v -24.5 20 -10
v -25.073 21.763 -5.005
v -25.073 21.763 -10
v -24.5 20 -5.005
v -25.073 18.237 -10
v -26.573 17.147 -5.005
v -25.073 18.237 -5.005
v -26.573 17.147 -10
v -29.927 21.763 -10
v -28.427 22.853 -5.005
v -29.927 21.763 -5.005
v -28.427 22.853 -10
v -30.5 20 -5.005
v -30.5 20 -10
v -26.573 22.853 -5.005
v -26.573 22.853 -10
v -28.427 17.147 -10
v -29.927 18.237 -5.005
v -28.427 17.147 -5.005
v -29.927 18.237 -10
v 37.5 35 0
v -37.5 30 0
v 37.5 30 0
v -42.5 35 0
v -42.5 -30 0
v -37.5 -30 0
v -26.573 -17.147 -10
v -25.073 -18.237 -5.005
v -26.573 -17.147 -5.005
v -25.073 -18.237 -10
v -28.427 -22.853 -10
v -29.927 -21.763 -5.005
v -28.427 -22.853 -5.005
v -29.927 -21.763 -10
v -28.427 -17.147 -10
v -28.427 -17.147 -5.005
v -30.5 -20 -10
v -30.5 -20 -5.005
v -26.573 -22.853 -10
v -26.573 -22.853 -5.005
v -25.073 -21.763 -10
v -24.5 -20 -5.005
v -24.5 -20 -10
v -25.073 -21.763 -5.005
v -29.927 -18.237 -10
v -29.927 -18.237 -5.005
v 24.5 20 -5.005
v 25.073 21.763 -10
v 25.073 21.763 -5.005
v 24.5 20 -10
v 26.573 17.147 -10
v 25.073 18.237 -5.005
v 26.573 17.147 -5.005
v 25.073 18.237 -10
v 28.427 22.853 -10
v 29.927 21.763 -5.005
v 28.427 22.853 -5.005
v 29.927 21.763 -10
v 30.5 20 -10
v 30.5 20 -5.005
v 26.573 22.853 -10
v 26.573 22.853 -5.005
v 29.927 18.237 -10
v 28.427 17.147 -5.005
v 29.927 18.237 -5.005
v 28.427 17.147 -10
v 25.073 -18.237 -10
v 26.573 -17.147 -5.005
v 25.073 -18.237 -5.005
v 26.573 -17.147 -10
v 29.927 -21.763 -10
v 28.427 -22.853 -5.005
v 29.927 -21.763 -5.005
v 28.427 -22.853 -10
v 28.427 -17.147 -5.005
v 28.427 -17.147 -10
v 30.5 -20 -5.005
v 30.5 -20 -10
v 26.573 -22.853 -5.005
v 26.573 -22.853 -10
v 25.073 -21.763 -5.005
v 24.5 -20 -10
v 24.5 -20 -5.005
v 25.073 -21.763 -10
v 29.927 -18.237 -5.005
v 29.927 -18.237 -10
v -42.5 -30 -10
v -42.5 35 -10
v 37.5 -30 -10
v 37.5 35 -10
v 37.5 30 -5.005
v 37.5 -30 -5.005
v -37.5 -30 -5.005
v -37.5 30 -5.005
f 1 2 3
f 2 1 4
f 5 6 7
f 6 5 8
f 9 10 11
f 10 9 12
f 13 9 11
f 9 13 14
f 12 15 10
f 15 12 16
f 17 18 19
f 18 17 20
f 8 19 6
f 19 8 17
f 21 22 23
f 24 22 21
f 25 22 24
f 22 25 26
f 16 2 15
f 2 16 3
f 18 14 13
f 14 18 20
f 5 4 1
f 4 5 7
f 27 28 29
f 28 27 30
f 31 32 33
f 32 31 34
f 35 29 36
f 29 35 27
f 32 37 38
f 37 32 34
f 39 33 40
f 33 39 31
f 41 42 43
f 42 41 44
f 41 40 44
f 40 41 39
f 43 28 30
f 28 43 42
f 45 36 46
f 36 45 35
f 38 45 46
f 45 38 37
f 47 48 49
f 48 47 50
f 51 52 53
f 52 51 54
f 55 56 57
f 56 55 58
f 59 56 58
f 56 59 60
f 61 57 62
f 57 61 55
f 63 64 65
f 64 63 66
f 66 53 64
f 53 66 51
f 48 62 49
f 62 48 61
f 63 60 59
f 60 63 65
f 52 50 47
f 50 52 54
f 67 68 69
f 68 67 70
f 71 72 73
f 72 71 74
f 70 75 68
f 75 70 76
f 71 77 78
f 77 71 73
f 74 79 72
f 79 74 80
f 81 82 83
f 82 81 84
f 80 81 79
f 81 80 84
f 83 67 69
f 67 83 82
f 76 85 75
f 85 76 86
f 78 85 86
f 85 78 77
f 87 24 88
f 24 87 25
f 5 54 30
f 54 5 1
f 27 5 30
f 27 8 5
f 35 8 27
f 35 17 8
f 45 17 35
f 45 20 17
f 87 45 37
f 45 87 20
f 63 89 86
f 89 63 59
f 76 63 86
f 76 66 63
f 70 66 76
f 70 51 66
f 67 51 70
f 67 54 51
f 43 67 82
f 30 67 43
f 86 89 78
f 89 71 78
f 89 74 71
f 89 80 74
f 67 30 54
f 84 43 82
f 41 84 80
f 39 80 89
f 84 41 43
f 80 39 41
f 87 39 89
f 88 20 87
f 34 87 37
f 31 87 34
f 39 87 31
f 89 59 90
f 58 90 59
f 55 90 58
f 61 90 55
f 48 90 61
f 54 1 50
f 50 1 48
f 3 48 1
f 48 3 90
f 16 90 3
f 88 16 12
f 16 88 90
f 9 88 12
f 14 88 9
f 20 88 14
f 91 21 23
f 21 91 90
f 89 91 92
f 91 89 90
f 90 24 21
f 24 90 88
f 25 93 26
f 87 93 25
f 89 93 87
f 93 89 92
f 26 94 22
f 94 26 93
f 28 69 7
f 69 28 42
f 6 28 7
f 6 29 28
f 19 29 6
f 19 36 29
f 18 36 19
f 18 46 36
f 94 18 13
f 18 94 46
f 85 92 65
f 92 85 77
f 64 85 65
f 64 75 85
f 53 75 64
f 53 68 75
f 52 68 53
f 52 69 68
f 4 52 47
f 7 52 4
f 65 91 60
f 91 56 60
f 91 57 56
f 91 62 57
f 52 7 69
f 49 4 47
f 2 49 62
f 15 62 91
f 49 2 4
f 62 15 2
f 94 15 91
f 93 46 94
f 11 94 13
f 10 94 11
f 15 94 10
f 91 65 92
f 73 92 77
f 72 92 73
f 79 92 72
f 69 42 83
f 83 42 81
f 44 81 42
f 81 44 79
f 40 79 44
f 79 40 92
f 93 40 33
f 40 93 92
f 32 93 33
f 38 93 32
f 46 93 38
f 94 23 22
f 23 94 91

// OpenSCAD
// file: Lib/o-ring.scad
module o_ring(id=20,girth=2.5,$fn=180){
    rotate_extrude(angle=360,$fn=$fn)translate([(id+girth)/2,0])circle(d=girth);
    //cylinder(d=id,h=0.1, center=true);    
}

//o_ring(id=40, girth=5);


module o_ring_groove(girth=3,length = 50, height = 100, radius = 15){
    translate([radius+(girth/2),radius+(girth/2),0]){
        difference(){
            o_ring(id=radius*2,girth=girth, $fn=$fn);
            translate([15,0,0])cube([30,40,6], center=true);
            translate([0,15,0])cube([40,30,6], center=true);
        }

        translate([-radius-(girth/2),length/2,0])
            rotate([90,0,0])
                cylinder(h=length+0.01,d=girth, center=true);

        translate([height/2,-radius-(girth/2),0])
            rotate([0,90,0])
                cylinder(h=height+0.01,d=girth, center=true);
    }
}

o_ring_groove();
// file: Lib/fillet_cylinder.scad
module filleted_cylinder(
    cylinder_height=2,
    cylinder_radius=1,
    fillet_radius_bottom=1,
    fillet_radius_top=0,
    nfaces=50
) {
    /* created by Kevin Lam on Dec 3, 2016 */
    union() {      
        cylinder(cylinder_height, r=cylinder_radius, $fn=nfaces, false);
        
        if (fillet_radius_bottom > 0) {
            difference() {
                cylinder(fillet_radius_bottom, r=cylinder_radius+fillet_radius_bottom, $fn=nfaces, false);
                translate([0, 0, fillet_radius_bottom])
                rotate_extrude($fn=nfaces)
                translate([cylinder_radius+fillet_radius_bottom, 0, 0])
                circle(fillet_radius_bottom, $fn=nfaces);
            }
        }
        
        if (fillet_radius_top>0) {
            difference() {
                translate([0,0,cylinder_height-fillet_radius_top])
                cylinder(fillet_radius_top, r=cylinder_radius+fillet_radius_top, $fn=nfaces, false);
                
                translate([0, 0, cylinder_height-fillet_radius_top])
                rotate_extrude($fn=nfaces)
                translate([cylinder_radius+fillet_radius_top, 0, 0])
                circle(fillet_radius_top, $fn=nfaces);
            }
        }
    }
}
// file: Lib/prism.scad
   module prism(l, w, h){
   polyhedron(
           points=[[0,0,0], [l,0,0], [l,w,0], [0,w,0], [0,w,h], [l,w,h]],
           faces=[[0,1,2,3],[5,4,3,2],[0,4,5,1],[0,3,4],[5,2,1]]
           );

   }
   
// file: Lib/corner_radiuser.scad
module cornerRadiuser(radius=6){
    difference(){
        translate([radius/2,radius/2,0])
        cube([radius,radius,radius*2], center=true);
        cylinder(h=(radius*2)+2,r=radius, center=true);
    }
}
// file: Lib/steppers.scad
/**
 * Implementation of a model of a 28BYJ-48 type cheapo stepper motor
 */
use <mirrorcopy.scad>;
module stepper28BYJ48(){
    color("light grey"){
        translate([0,-8,0]){
            // Motor body
            translate([0,0,(19/2)*-1]){
                cylinder(d=28,h=19, center=true);
            }

            // Motor snooter
            translate([0,8,0]){
                translate([0,0,(1.5/2)])cylinder(d=9,h=1.5, center=true);
                difference(){
                    translate([0,0,(5/2)+2])cylinder(d=5,h=6, center=true);
                    mirrorCopy([0,1,0]){
                        translate([0,4,(5/2)+2.1])cube([5,5,6.2], center=true);
                    }
                }
            }
            
            // cable gland
            translate([0,(17/2)*-1,(19/2)*-1]){
                cube([14.8,17,19], center=true);
            }
            
            // Attachment crossbar
            difference(){
                hull(){
                    mirrorCopy([1,-0,0]){
                        translate([(35/2),0,(1/2)*-1]){
                            cylinder(h=1,d=7, center=true);
                        }
                    }
                }
                mirrorCopy([1,-0,0]){
                    translate([(35/2),0,(1/2)*-1]){
                        cylinder(h=1+0.01,d=4.2, center=true);
                    }
                }
            }
        }
    }
}


module stepper28BYJ48_cutouts(){
    color("orange"){
        translate([0,-8,0]){
            mirrorCopy([1,-0,0]){
                translate([(35/2),0,(1/2)*-1]){
                    cylinder(h=1+0.01,d=4.2, center=true);
                }
            }
        }
    }
}

module nemaCutout(shaftClearance, shaftGirth, shaftLength, frameSize, holeSpacing,holeDiameter=3,       nemaSlotSlackMM=0, shaft=false){
    translate([0,0,frameSize/-2]){
        hull(){
            mirrorCopy([0,1,0]){
                translate([0,nemaSlotSlackMM/2]){
                    cube([frameSize*1.01,frameSize*1.01,frameSize], center=true);
                }
            }
        }
    }
    if(!shaft){
        translate([0,0,10/2]){
            mirrorCopy([1,0,0]){
                mirrorCopy([0,1,0]){
                    translate([holeSpacing/2,holeSpacing/2,0]){
                        hull(){
                            mirrorCopy([0,1,0]){
                                translate([0,nemaSlotSlackMM/2,0]){
                                    cylinder(d=holeDiameter*1.1,h=30,center=true);
                                }
                            }
                        }
                    }
                }
            }
        }
    }
    
    if(!shaft){
        translate([0,0,-0.5]){
            cylinder(d=shaftClearance*1.03,h=shaftLength+1);
        }
    }else{
        difference(){
            cylinder(d=shaftGirth*1.03,h=shaftLength*2, $fn=360);
            translate([frameSize/-2,(shaftGirth/2)-(shaftGirth)*0.15,shaftLength*0.3+0.01]){
                cube([frameSize,frameSize/2,shaftLength*0.70]);
                translate([0,0,shaftLength*0.70-1])cube([frameSize,frameSize/2,shaftLength+1]);
            }
        }
    }
}

module nema14_cutout(){
    nemaCutout(22,5,24,35,26,3,2, shaft);
}

module nema17_cutout(shaft=false){
    
    nemaCutout(22,5,24,42.3,31,3,2, shaft);
}

nema17_cutout(true);
// file: Lib/metric_bolts.scad
capSizeMSizeMultiplier = 1.66*1.01;
printingKerfMM = 0.6;
circleFacets = 60;
boltColour = "LightSkyBlue";
boltClearanceColour = "LightSteelBlue";
boltClearanceTransparency = 0.3;

module metricBoltHex(mSize, structural=false, recessNut=0, recessNutIsCircleMM=false, chamfer=false){
    // Hex diameter = mSize * 1.8, (or 2.0 if structural
    // We add 1% to make the hex slip in better
    hexDiameter = (mSize * (structural?2.0:1.8) * 1.01) + printingKerfMM;

    color(boltColour)
    translate([0,0,(mSize*0.7)/2])
    cylinder(d=hexDiameter,h=mSize * 0.7, $fn=6, center=true);
    
    if(recessNut > 0){
        if(recessNutIsCircleMM==false){
            color(boltClearanceColour, boltClearanceTransparency)
                translate([0,0,(recessNut/2)*-1+0.1])
                    cylinder(d=hexDiameter,h=recessNut+0.1, $fn=6, center=true);
        }else{
            color(boltClearanceColour, boltClearanceTransparency)
                translate([0,0,(recessNut/2)*-1+0.1])
                    cylinder(d=recessNutIsCircleMM>hexDiameter?recessNutIsCircleMM:hexDiameter,h=recessNut+0.1, $fn=circleFacets, center=true);
        }
    }
    if(chamfer){
        chamferHeight = mSize*1.5*0.595;
        color(boltClearanceColour, boltClearanceTransparency)
            translate([0,0,(mSize * 0.7)+(chamferHeight/2)])
                cylinder(d1=hexDiameter,d2=0,h=chamferHeight, center=true, $fn=6);
    }
}

module metricSocketCap(mSize, length, structural=false,recessCap=0, chamfer=false, overrideCapSize=0){
    //cap size = M number * 1.5.
    // We add 1% to make the cap head spin nicely in the hole.
    capSize = overrideCapSize > 0 ? overrideCapSize : (mSize * capSizeMSizeMultiplier) + printingKerfMM;
    
    color(boltColour)
        translate([0,0,(length + ((mSize*1.25)/2))])
            cylinder(d=capSize,h=mSize*1.25, center=true, $fn=circleFacets);
    //echo (str("cap size is ", capSize));
    if(recessCap > 0){
        color(boltClearanceColour, boltClearanceTransparency)
        translate([0,0,(length + ((recessCap/2)+(mSize*1.25)))])
        cylinder(d=capSize,h=recessCap+0.01, center=true, $fn=circleFacets);
    }
    if(chamfer){
        color(boltClearanceColour, boltClearanceTransparency)
        translate([0,0,(length-((mSize*1.5*0.595)/2))])
        cylinder(d2=capSize,d1=0,h=mSize*1.5*0.595, center=true, $fn=circleFacets);
    }
}

module metricShaft(mSize, length, structural=false){
    color(boltColour)
        translate([0,0,(length/2)])
            cylinder(d=mSize+printingKerfMM, h=length+0.01, center=true, $fn=circleFacets);
}

module metricSocketScrew(mSize, length, structural=false, recessCap=0, chamfer=false, overrideCapSize=0){
    metricSocketCap(mSize, length, structural=structural, recessCap=recessCap, chamfer=chamfer, overrideCapSize=overrideCapSize);
    metricShaft(mSize, length, structural=structural);
}

module metricCapheadAndBolt(mSize, length=40, structural=false, recessCap=0, recessNut=0, recessNutIsCircleMM=false, chamfer=false, overrideCapSize=0){
    capSize = overrideCapSize > 0 ? overrideCapSize : (mSize * capSizeMSizeMultiplier) + printingKerfMM;

    /*echo (str("Creating a M",mSize, " size, ", length, "mm long bolt with a ", capSize, "mm wide caphead and bolt ", chamfer?"with":"without", " chamfering."));
    if(recessCap){
        echo (str("It has a ", recessCap, "mm recessed cap"));
    }
    if(recessNut){
        echo (str("It has a ", recessCap, "mm recessed nut"));
    }/**/
    translate([0,0,((length/2)+((mSize*1.25)/2))*-1])
    union(){
        translate([0, 0, 0])
        metricSocketScrew(mSize, length, structural=structural, recessCap=recessCap, chamfer=chamfer, overrideCapSize=overrideCapSize);
        metricBoltHex(mSize,structural, recessNut=recessNut, recessNutIsCircleMM=recessNutIsCircleMM, chamfer=chamfer);
    }
}

/**/
translate([0,10,0])
metricCapheadAndBolt(6, 40);

translate([0,10,0])
metricCapheadAndBolt(6, 40, recessNut=20, recessNutIsCircleMM=20);

translate([20,10,0])
metricCapheadAndBolt(6, 40, recessNut=1, recessCap=1, chamfer=true);
/**/
/*
translate([0,10,0])
metricCapheadAndBolt(6, 20, recessNut=10, recessCap=10);
/*
translate([0,20,0])
metricCapheadAndBolt(6, 20, chamfer=true);

translate([20,0,0])
metricCapheadAndBolt(10, 40);

translate([20,20,0])
metricCapheadAndBolt(10, 40, recessNut=10, recessCap=10);

translate([20,40,0])
metricCapheadAndBolt(10, 40, chamfer=true);
*/
// file: Lib/pcd.scad
module pcd(degrees, totalDegrees=360){
    count=totalDegrees/degrees;
    for(i=[1 : count]){
        rotate(degrees*i)
        children();
    }
}

module pcdAtFixedDegrees(degrees){
    for(degree=degrees){
        rotate(degree)
        children();
    }
}

pcd(30)
    translate([30,0,0])
        cylinder(h=10,d=5, center=true, $fn=30);
// file: Lib/extrusion.scad
use <mirrorcopy.scad>
module doubleExtrusion(width,length, center=false){
    extraWallWidth = width*0.09;
    mirrorCopy([0,1,0]){
        color("orange")
        translate([0,(width - extraWallWidth)/2,length/2])
        cube([center?0:width/2,extraWallWidth,length], center=true);
    }
    
    translate([(width/2),0,0])
    children();
    translate([(width/2)*-1,0,0])
    children();
    color("grey",0.1)hull(){
        translate([(width/2),0,0])
        children();
        translate([(width/2)*-1,0,0])
        children();
    }
}

module extrusion_sub(length=10, outer=40, tSlot=8, gusset=4.5, bore=7, center=false){
    translate([0,0,center?0:length/2]){
        difference(){
            color("orange")
            union(){
                // Corners
                mirrorCopy([1,0,0]){
                    mirrorCopy([0,1,0]){
                        difference(){
                            union(){
                                translate([((outer-(outer-tSlot)/2)/2),(outer-(gusset))/2,0])
                                cube([(outer-tSlot)/2, (gusset),length], center=true);
                                mirror([-1,1,0])
                                translate([((outer-(outer-tSlot)/2)/2),(outer-(gusset))/2,0])
                                cube([(outer-tSlot)/2, (gusset),length], center=true);
                            }
                            difference(){
                                translate([((outer-(gusset))/2)+1,((outer-(gusset))/2)+1,0])
                                    cube([gusset*2,gusset*2,length+2], center=true);
                                translate([(outer-(gusset*2))/2,(outer-(gusset*2))/2,0])
                                    cylinder(d=gusset*2,h=length+4, center=true);
                            }
                        }
                    }
                }
                
                // Crossbar
                mirrorCopy(){
                    rotate(45)
                    cube([outer*1.3, gusset, length], center=true);
                }
                
                // Core
                cube([bore*2,bore*2,length], center=true);
            };
            
            union(){
                // Tappable Bore
                cylinder(d=bore, h=length+2, center=true);
            }
        }
    }
}
module extrusion(length=10, outer=40, tSlot=8, gusset=4.5, bore=7, center=false){
    color("grey",0.1)hull()extrusion_sub(length=length, outer=outer, tSlot=tSlot, gusset=gusset, bore=bore, center=center);
    extrusion_sub(length=length, outer=outer, tSlot=tSlot, gusset=gusset, bore=bore, center=center);
    echo(str("BOM: Extrusion(",outer,"mm) length=",length,"mm"));
}

module extrusion80x40(length, center=false){
    doubleExtrusion(40,length, center=center)
    extrusion40x40(length, center=center);
}
module extrusion60x30(length, center=false){
    doubleExtrusion(30,length, center=center)
    extrusion30x30(length, center=center);
}
module extrusion40x20(length, center=false){
    doubleExtrusion(20,length, center=center)
    extrusion20x20(length, center=center);
}

module extrusion20x20(length, center=false)
{
    extrusion(length=length, outer=20,tSlot=5, gusset=1.8, bore=4, center=center);
}

module extrusion30x30(length, center=false)
{
    extrusion(length=length, outer=30,tSlot=8, gusset=2.5, bore=7, center=center);
}

module extrusion40x40(length, center=false)
{
    extrusion(length=length, outer=40,tSlot=8, gusset=4.5, bore=7, center=center);
}
/**/
translate([-40,0,0])extrusion20x20(10, center=true);
translate([-60,30,0])extrusion30x30(10, center=true);
translate([-80,30+40,0])extrusion40x40(10, center=true);

translate([0,0,0])extrusion20x20(10);
translate([0,30,0])extrusion30x30(10);
translate([0,30+40,0])extrusion40x40(10);

translate([40,0,0])extrusion40x20(10);
translate([60,30,0])extrusion60x30(10);
translate([80,30+40,0])extrusion80x40(10);
/**/
// file: Lib/part_splitter.scad
module partSplitter(height=0,maxSize=200, spread=10, top=true, bottom=true){
    if($preview){
        children();
        translate([0,0,height])
            #cube([maxSize,maxSize,0.01], center=true);
    }else{
        if(top){
            color("red")
                translate([0,0,(spread/2)])
                    difference(){
                        children();
                        translate([0,0,((maxSize/2)*-1)+height])
                            cube([maxSize,maxSize,maxSize], center=true);
                    }
        }
        if(bottom){
            color("green")
                translate([0,0,(spread/2)*-1])
                    difference(){
                        children();
                        translate([0,0,(maxSize/2)+height])
                            cube([maxSize,maxSize,maxSize], center=true);
                    }
        }
    }
} 
// file: Lib/mirrorcopy.scad
module mirrorCopy(vec=[1,0,0], vec2=[0,0,0], vec3=[0,0,0]){
    
    //echo(str("Vec1=",vec," Vec2=", vec2, " Vec3=", vec3));
    children();
    mirror(vec) children();

    if(vec2){    
        mirror(vec2){
            children();
            mirror(vec) children();
        }
    }

    if(vec3){
        mirror(vec3){
            children();
            mirror(vec) children();
            mirror(vec2){
                children();
                mirror(vec) children();
            }
        }
    }
    
} 

mirrorCopy([1,0,0])color("green")translate([5,10,0])cylinder(h=1,d=5,center=true);
mirrorCopy([1,0,0],[0,1,0])color("blue")translate([10,5,0])cylinder(h=1,d=5,center=true);
mirrorCopy([1,0,0],[0,1,0],[0,0,1])color("red")translate([15,10,5])cylinder(h=1,d=5,center=true);
// file: Lib/bearings.scad
$useMcMaster = true;
module bearing(id, od, wd, mcmaster, series, labels=false){
    //echo(str("Creating a ", series, " bearing with id=", id, "mm od=", od, "mm width=", wd, "mm ..."));
    difference(){
        color("grey")cylinder(d=od,h=wd, center=true);
        color("white")cylinder(d=id,h=wd+1, center=true);  
        if($preview && labels){
            bearing_lettering(id, od, wd, mcmaster, series);    
        }
    }
}

module bearing_lettering(id, od, wd, mcmaster, series)
{
    degreesSeries = 25*len(series);
    degreesMcMaster = 25*len(mcmaster);
    color("black")
    rotate(180+45){
        rotate(degreesSeries)
        bearing_text(id,od, wd, series,degreesSeries);
        if($useMcMaster){
            rotate(degreesMcMaster+degreesSeries+10)
            bearing_text(id,od, wd, mcmaster, degreesMcMaster);   
        }
    }
}

module bearing_text(id, od, wd, st, radiusConsumed=180){
    bearingGirth = (od-id)/2;
    letterHeight = bearingGirth * 0.6;
    letterOffsetFromCenter = (od/2) - (bearingGirth*0.9);
    
    width=bearingGirth ;
    thickness=wd/20 ;
    chars=len(st)+1 ;
    //echo(str("Writing ", st, " at " , letterOffsetFromCenter, "mm from center"));
    for (i = [1:chars]) {
            rotate([0,0,90-(i*(radiusConsumed/chars))])
            translate([0,letterOffsetFromCenter,(bearingGirth/2)-((thickness+1)/2)])
            linear_extrude(thickness+1)
            text(st[i-1],size=letterHeight, halign="center");
    }
}


module bearing_608(labels=true){ bearing(8,22,7,"5972K91","608", labels=labels); }
module bearing_626(labels=true){ bearing(6,19,6,"6661K11","626", labels=labels); }
module bearing_629(labels=true){ bearing(9,26,8,"5972K93","629", labels=labels); }
module bearing_635(labels=true){ bearing(5,19,6,"5972K197","635", labels=labels); }
module bearing_6000(labels=true){ bearing(10,26,8,"5972K94","6000", labels=labels); }
module bearing_6001(labels=true){ bearing(12,28,8,"5972K95","6001", labels=labels); }
module bearing_6002(labels=true){ bearing(15,32,9,"5972K358","6002", labels=labels); }
module bearing_6003(labels=true){ bearing(17,35,10,"5972K311","6003", labels=labels); }
module bearing_6007(labels=true){ bearing(35,62,14,"5972K312","6007", labels=labels); }
module bearing_6200(labels=true){ bearing(10,30,9,"5972K101","6200", labels=labels); }
module bearing_6201(labels=true){ bearing(12,32,10,"5972K313","6201", labels=labels); }
module bearing_6202(labels=true){ bearing(15,35,11,"5972K314","6202", labels=labels); }
module bearing_6203(labels=true){ bearing(17,40,12,"5972K104","6203", labels=labels); }
module bearing_6204(labels=true){ bearing(20,47,14,"5972K105","6204", labels=labels); }
module bearing_6205(labels=true){ bearing(25,52,15,"5972K315","6205", labels=labels); }
module bearing_6206(labels=true){ bearing(30,62,16,"5972K316","6206", labels=labels); }
module bearing_6207(labels=true){ bearing(35,72,17,"5972K317","6207", labels=labels); }
module bearing_6208(labels=true){ bearing(40,80,18,"5972K114","6208", labels=labels); }
module bearing_6209(labels=true){ bearing(45,85,19,"5972K115","6209", labels=labels); }
module bearing_6210(labels=true){ bearing(50,90,20,"5972K129","6210", labels=labels); }
module bearing_6211(labels=true){ bearing(55,100,21,"5972K113","6211", labels=labels); }
module bearing_6212(labels=true){ bearing(60,110,22,"5972K3","6212", labels=labels); }
module bearing_6301(labels=true){ bearing(12,37,12,"5972K318","6301", labels=labels); }
module bearing_6302(labels=true){ bearing(15,42,13,"5972K117","6302", labels=labels); }
module bearing_6303(labels=true){ bearing(17,47,14,"5972K118","6303", labels=labels); }
module bearing_6304(labels=true){ bearing(20,52,15,"5972K119","6304", labels=labels); }
module bearing_6305(labels=true){ bearing(25,62,17,"5972K121","6305", labels=labels); }
module bearing_6306(labels=true){ bearing(30,72,19,"5972K319","6306", labels=labels); }
module bearing_6307(labels=true){ bearing(35,80,21,"5972K503","6307", labels=labels); }
module bearing_6308(labels=true){ bearing(40,90,23,"5972K124","6308", labels=labels); }
module bearing_6309(labels=true){ bearing(45,100,25,"5972K125","6309", labels=labels); }
module bearing_6310(labels=true){ bearing(50,110,27,"5972K126","6310", labels=labels); }
module bearing_6311(labels=true){ bearing(55,120,29,"5972K127","6311", labels=labels); }
module bearing_6312(labels=true){ bearing(60,130,31,"5972K128","6312", labels=labels); }
module bearing_6403(labels=true){ bearing(17,62,17,"5972K198","6403", labels=labels); }
module bearing_6800(labels=true){ bearing(10,19,5,"5972K211","6800", labels=labels); }
module bearing_6801(labels=true){ bearing(12,21,5,"5972K212","6801", labels=labels); }
module bearing_6802(labels=true){ bearing(15,24,5,"5972K213","6802", labels=labels); }
module bearing_6803(labels=true){ bearing(17,26,5,"5972K214","6803", labels=labels); }
module bearing_6804(labels=true){ bearing(20,32,7,"5972K215","6804", labels=labels); }
module bearing_6805(labels=true){ bearing(25,37,7,"5972K216","6805", labels=labels); }
module bearing_6806(labels=true){ bearing(30,42,7,"5972K217","6806", labels=labels); }
module bearing_6900(labels=true){ bearing(10,22,6,"5972K241","6900", labels=labels); }
module bearing_6901(labels=true){ bearing(12,24,6,"5972K242","6901", labels=labels); }
module bearing_6902(labels=true){ bearing(15,28,7,"5972K243","6902", labels=labels); }
module bearing_6903(labels=true){ bearing(17,30,7,"5972K244","6903", labels=labels); }
module bearing_6904(labels=true){ bearing(20,37,9,"5972K245","6904", labels=labels); }
module bearing_6905(labels=true){ bearing(25,42,9,"5972K246","6905", labels=labels); }
module bearing_6906(labels=true){ bearing(30,47,9,"5972K247","6906", labels=labels); }
module bearing_6907(labels=true){ bearing(35,55,10,"5972K248","6907", labels=labels); }
module bearing_6908(labels=true){ bearing(40,62,12,"5972K249","6908", labels=labels); }
module bearing_16002(labels=true){ bearing(15,32,8,"5972K199","16002", labels=labels); }
module bearing_16004(labels=true){ bearing(20,42,8,"5972K218","16004", labels=labels); }
module bearing_16005(labels=true){ bearing(25,47,8,"5972K219","16005", labels=labels); }
module bearing_16100(labels=true){ bearing(10,28,8,"5972K223","16100", labels=labels); }
module bearing_16101(labels=true){ bearing(12,30,8,"5972K224","16101", labels=labels); }

translate([0,0,0])
{   
    bearing_6800();
    bearing_6804();
    bearing_6907();
    translate([50,0,0])
    bearing_16101();
}


translate([0,60,0])
{   
    bearing_6800(labels=false);
    bearing_6804(labels=false);
    bearing_6907(labels=false);
    translate([50,0,0])
    bearing_16101(labels=false);
}
// file: Lib/mattlib.scad
include <../Lib/bearings.scad>;
include <../Lib/mirrorcopy.scad>;
include <../Lib/part_splitter.scad>;
include <../Lib/extrusion.scad>;
include <../Lib/pcd.scad>;
include <../Lib/metric_bolts.scad>;
include <../Lib/steppers.scad>;
include <../Lib/corner_radiuser.scad>;
include <../Lib/gears.scad>;
include <../Lib/prism.scad>;
include <../Lib/fillet_cylinder.scad>;
include <../Lib/o-ring.scad>;
// main file
use <Lib/mattlib.scad>;
rotate([0,180,0])
difference(){
    translate([2.5,2.5,10/2])cube([80,65,10], center=true);
    mirrorCopy([1,0,0])mirrorCopy([0,1,0])translate([55/2,40/2,10])cylinder(h=20,d=6, center=true);
    translate([0,0,5/2])cube([75,60,5]+[0,0,0.01], center=true);
}
